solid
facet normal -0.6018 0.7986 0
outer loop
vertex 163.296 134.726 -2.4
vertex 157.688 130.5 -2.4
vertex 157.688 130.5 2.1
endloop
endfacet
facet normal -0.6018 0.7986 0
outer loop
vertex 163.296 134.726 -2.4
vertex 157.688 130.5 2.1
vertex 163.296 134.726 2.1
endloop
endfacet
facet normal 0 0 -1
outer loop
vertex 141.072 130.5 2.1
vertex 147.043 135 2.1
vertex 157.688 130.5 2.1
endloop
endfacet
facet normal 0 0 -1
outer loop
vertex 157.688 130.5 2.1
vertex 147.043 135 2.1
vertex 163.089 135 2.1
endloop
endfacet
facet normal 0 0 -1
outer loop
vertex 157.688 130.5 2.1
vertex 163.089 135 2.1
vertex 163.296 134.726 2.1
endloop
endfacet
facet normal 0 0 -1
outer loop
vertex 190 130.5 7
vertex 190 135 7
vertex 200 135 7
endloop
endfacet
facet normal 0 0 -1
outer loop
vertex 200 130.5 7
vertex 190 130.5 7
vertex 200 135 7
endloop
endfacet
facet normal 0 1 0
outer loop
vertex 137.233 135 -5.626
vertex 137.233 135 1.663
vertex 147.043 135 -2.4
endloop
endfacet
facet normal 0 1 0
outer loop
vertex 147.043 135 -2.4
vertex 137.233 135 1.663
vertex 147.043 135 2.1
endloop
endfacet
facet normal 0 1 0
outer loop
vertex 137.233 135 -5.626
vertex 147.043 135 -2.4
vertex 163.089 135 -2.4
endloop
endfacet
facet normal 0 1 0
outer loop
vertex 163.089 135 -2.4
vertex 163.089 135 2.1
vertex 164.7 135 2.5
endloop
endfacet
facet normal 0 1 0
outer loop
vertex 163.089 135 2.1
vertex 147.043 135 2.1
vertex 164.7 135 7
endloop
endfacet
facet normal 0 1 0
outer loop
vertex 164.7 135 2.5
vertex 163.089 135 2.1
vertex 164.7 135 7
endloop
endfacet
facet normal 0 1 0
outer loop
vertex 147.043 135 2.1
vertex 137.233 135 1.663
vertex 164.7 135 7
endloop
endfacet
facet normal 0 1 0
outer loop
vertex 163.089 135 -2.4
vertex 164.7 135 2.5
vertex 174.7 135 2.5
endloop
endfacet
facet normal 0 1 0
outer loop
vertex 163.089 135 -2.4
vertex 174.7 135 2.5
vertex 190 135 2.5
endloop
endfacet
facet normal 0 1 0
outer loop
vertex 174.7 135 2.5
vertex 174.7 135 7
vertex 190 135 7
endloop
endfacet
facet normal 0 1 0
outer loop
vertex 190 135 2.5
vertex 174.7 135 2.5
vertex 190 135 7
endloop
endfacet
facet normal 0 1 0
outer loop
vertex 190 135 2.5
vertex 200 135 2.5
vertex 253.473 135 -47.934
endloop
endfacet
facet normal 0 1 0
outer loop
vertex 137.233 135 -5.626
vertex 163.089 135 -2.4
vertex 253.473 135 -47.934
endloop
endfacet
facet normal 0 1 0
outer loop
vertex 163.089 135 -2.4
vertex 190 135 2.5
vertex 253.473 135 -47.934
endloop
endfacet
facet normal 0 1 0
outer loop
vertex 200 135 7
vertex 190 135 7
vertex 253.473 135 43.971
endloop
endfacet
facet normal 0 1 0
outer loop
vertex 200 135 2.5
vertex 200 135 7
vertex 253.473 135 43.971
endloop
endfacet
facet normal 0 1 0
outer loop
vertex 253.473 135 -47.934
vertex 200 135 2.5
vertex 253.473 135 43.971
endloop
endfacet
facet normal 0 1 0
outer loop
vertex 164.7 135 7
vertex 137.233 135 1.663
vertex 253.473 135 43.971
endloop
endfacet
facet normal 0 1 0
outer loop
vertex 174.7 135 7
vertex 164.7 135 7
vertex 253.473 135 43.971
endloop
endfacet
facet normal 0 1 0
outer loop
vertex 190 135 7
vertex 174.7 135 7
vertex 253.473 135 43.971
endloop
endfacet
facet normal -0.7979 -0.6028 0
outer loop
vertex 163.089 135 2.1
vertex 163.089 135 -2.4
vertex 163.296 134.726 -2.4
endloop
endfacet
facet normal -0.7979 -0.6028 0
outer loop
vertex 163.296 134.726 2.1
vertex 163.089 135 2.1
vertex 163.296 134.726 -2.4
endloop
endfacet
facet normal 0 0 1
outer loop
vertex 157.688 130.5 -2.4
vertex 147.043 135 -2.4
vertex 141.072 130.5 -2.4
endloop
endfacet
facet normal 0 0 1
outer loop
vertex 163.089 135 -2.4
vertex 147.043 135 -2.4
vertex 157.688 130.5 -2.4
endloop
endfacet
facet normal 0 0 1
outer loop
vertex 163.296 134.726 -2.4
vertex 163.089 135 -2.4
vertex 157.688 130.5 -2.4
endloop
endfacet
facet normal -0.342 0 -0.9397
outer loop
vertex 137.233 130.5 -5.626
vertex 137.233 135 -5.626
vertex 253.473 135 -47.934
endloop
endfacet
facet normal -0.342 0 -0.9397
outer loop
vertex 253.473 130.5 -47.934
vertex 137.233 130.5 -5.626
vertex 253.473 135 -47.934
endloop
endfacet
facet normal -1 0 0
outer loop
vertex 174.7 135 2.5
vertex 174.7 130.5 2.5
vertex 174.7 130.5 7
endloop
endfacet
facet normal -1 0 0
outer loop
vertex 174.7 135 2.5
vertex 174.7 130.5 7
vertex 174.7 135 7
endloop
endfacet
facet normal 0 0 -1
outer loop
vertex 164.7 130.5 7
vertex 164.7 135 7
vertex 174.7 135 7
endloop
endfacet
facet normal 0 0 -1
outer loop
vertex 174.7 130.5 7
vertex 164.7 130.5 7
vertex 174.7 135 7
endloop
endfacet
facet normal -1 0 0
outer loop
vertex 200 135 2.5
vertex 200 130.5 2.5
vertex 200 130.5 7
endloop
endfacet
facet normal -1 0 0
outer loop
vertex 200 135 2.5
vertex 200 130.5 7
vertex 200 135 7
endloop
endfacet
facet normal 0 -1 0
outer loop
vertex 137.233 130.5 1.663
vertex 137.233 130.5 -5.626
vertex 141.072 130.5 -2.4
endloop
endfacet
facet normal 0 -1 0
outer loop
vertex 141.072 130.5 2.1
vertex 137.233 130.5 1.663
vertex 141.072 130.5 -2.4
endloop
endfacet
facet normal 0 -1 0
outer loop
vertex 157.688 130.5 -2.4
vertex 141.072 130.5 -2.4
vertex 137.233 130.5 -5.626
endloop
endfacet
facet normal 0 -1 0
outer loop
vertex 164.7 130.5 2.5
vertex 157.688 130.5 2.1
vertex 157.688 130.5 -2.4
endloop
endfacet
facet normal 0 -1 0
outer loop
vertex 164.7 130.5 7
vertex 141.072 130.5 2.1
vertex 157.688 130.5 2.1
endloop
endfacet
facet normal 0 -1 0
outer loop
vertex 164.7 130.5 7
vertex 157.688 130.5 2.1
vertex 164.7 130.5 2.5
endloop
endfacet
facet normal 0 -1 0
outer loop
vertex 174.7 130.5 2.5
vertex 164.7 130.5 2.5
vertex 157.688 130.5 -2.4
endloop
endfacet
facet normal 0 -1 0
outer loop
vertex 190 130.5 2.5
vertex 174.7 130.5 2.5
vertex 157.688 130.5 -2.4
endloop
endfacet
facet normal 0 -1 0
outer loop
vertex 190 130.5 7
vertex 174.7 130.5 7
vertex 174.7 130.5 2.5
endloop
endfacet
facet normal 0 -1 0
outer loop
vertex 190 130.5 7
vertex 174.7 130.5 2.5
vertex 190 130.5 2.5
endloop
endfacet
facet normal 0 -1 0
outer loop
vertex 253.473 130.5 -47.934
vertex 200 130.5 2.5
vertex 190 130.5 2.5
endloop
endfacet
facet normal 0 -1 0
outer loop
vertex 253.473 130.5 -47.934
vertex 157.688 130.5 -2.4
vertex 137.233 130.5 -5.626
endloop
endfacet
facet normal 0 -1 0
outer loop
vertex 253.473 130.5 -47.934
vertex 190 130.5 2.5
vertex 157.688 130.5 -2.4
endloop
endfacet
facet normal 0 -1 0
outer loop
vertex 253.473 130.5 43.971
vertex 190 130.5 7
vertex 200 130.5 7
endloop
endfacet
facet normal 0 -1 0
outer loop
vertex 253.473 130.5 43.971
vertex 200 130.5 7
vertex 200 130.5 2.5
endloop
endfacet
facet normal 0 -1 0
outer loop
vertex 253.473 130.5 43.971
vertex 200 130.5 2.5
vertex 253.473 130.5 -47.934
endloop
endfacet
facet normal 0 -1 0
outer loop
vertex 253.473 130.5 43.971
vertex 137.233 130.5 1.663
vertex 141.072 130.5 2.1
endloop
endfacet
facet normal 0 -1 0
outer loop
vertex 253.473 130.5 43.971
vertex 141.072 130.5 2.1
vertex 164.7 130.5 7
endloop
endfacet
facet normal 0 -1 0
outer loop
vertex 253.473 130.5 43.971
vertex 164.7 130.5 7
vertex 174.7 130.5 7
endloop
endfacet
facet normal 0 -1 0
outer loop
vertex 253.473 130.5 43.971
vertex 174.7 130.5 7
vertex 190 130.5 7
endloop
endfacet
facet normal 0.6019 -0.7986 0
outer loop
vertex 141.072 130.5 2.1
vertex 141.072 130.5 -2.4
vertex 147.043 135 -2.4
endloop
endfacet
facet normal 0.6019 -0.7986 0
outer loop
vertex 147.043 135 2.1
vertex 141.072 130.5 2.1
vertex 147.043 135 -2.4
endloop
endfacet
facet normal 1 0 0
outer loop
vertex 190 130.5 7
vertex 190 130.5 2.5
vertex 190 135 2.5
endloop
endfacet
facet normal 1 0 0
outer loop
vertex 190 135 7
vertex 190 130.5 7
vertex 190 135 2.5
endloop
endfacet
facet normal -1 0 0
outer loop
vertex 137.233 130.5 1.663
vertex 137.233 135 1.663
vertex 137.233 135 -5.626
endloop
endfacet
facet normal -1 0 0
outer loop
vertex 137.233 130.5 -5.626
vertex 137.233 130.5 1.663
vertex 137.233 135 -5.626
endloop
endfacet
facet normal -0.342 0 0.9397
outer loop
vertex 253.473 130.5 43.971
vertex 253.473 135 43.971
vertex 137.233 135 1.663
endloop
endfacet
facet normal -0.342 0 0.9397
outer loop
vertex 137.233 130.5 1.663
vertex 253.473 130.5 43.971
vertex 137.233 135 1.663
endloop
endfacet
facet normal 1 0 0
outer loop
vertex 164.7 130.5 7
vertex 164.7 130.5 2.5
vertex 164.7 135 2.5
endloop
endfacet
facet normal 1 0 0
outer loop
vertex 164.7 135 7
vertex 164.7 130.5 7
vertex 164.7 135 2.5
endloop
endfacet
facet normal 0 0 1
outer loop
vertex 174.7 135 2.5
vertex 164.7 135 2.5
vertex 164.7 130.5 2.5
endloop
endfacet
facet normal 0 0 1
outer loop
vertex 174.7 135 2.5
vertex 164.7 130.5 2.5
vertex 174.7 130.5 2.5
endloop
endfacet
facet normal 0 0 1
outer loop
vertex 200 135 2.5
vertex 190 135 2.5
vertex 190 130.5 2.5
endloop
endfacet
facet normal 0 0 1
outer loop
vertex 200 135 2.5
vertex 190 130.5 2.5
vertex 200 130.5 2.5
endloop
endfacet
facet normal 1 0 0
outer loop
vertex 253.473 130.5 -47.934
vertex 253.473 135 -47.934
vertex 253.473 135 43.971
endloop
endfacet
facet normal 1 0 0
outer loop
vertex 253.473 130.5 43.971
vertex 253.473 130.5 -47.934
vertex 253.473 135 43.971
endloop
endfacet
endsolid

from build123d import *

# Parameters (mm, degrees)
BOX006_W               = 10
BOX006_H               = 154
BOX006_DEPTH           = 4.5
BOX006_PLACEMENT_ANGLE = 307
BOX001_W               = 10
BOX001_H               = 232
BOX001_DEPTH           = 4.5
BOX_W                  = 10
BOX_H                  = 232
BOX_DEPTH              = 4.5
PAD001_DEPTH           = 4.5


with BuildPart() as front_spar001:
    # Box006 → Box006 (new body)
    with BuildSketch(Plane.XY):
        with Locations((5, 77)):
            Rectangle(BOX006_W, BOX006_H)
    extrude(amount=BOX006_DEPTH)


with BuildPart() as front_spar001_1:
    # Box006 placement: moved
    add(front_spar001.part.moved(Location((34.287817, 50.032507, -2.4))).rotate(Axis((34.287817, 50.032507, -2.4), (0, 0, 1)), BOX006_PLACEMENT_ANGLE))


with BuildPart() as cube001:
    # Box001 → Box001 (new body)
    with BuildSketch(Plane(origin=(164.7, -92.4, 2.5), x_dir=(1, 0, 0), z_dir=(0, 0, 1))):
        with Locations((5, 116)):
            Rectangle(BOX001_W, BOX001_H)
    extrude(amount=BOX001_DEPTH)


with BuildPart() as cube:
    # Box → Box (new body)
    with BuildSketch(Plane(origin=(190, -89.9, 2.5), x_dir=(1, 0, 0), z_dir=(0, 0, 1))):
        with Locations((5, 116)):
            Rectangle(BOX_W, BOX_H)
    extrude(amount=BOX_DEPTH)


with BuildPart() as cut035:
    # Sketch001 → Pad001 (new body)
    with BuildSketch(Plane.XZ):
        Polygon((-112.766838, 5.66261), (-112.766838, -1.625728), (3.473136, -43.933619), (3.473136, 47.970501), align=None)
    extrude(amount=PAD001_DEPTH)


with BuildPart() as cut035_1:
    # Body001 placement: moved
    add(cut035.part.moved(Location((250, 135, -4))))

    # Cut011: cut Cube
    add(cube.part, mode=Mode.SUBTRACT)

    # Cut023: cut Cube001
    add(cube001.part, mode=Mode.SUBTRACT)

    # Cut035: cut front spar001
    add(front_spar001_1.part, mode=Mode.SUBTRACT)


solid = cut035_1.part
